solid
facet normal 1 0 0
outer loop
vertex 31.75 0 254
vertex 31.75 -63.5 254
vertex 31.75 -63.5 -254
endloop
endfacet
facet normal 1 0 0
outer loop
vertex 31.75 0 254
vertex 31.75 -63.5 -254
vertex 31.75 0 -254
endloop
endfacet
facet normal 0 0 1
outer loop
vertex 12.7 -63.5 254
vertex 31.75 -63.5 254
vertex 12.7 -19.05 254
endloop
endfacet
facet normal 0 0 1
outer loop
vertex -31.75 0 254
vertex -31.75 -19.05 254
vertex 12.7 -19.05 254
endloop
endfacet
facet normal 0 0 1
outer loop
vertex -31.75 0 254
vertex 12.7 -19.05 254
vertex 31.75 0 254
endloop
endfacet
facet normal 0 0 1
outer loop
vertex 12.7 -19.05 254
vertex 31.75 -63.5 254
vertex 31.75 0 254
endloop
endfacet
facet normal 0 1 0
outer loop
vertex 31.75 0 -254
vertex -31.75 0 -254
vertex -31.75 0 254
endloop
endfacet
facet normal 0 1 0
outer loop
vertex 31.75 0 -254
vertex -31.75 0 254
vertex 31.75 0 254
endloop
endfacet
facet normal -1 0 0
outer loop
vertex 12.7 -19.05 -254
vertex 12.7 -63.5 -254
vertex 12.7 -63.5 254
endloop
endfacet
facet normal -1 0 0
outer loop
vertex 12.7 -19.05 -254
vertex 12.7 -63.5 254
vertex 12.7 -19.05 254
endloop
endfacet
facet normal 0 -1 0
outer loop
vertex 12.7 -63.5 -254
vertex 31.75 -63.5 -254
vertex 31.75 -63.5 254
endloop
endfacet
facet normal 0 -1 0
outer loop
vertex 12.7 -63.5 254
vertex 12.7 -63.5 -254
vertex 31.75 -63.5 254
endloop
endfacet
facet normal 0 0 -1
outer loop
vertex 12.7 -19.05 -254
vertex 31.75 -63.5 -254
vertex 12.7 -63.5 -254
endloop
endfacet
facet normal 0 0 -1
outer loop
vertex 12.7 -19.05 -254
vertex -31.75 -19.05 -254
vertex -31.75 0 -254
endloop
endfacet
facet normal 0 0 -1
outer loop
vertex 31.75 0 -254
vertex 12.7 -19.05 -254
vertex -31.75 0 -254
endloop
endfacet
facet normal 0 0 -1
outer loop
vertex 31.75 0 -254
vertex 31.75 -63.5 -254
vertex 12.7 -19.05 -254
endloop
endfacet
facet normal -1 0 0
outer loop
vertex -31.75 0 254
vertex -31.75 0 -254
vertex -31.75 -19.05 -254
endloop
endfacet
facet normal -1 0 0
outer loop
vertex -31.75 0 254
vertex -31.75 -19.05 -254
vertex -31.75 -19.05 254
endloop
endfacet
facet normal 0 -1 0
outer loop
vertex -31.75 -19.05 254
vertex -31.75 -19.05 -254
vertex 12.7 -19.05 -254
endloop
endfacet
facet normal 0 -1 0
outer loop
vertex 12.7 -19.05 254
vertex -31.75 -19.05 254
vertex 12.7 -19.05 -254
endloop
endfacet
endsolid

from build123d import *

# Parameters (mm, degrees)
F0_W     = 63.5
F0_H     = 508
F1_DEPTH = 19.05
F2_W     = 44.45
F2_H     = 508
F3_DEPTH = 19.05


with BuildPart() as f1:
    # F0 (on Front) → F1 (new body)
    with BuildSketch(Plane.XZ):
        Rectangle(F0_W, F0_H)
    extrude(amount=F1_DEPTH)

    # F2 (on face) → F3 (join)
    with BuildSketch(Plane.YZ.offset(31.75)):
        with Locations((-41.275, 0)):
            Rectangle(F2_W, F2_H)
    extrude(amount=-F3_DEPTH)


solid = f1.part
